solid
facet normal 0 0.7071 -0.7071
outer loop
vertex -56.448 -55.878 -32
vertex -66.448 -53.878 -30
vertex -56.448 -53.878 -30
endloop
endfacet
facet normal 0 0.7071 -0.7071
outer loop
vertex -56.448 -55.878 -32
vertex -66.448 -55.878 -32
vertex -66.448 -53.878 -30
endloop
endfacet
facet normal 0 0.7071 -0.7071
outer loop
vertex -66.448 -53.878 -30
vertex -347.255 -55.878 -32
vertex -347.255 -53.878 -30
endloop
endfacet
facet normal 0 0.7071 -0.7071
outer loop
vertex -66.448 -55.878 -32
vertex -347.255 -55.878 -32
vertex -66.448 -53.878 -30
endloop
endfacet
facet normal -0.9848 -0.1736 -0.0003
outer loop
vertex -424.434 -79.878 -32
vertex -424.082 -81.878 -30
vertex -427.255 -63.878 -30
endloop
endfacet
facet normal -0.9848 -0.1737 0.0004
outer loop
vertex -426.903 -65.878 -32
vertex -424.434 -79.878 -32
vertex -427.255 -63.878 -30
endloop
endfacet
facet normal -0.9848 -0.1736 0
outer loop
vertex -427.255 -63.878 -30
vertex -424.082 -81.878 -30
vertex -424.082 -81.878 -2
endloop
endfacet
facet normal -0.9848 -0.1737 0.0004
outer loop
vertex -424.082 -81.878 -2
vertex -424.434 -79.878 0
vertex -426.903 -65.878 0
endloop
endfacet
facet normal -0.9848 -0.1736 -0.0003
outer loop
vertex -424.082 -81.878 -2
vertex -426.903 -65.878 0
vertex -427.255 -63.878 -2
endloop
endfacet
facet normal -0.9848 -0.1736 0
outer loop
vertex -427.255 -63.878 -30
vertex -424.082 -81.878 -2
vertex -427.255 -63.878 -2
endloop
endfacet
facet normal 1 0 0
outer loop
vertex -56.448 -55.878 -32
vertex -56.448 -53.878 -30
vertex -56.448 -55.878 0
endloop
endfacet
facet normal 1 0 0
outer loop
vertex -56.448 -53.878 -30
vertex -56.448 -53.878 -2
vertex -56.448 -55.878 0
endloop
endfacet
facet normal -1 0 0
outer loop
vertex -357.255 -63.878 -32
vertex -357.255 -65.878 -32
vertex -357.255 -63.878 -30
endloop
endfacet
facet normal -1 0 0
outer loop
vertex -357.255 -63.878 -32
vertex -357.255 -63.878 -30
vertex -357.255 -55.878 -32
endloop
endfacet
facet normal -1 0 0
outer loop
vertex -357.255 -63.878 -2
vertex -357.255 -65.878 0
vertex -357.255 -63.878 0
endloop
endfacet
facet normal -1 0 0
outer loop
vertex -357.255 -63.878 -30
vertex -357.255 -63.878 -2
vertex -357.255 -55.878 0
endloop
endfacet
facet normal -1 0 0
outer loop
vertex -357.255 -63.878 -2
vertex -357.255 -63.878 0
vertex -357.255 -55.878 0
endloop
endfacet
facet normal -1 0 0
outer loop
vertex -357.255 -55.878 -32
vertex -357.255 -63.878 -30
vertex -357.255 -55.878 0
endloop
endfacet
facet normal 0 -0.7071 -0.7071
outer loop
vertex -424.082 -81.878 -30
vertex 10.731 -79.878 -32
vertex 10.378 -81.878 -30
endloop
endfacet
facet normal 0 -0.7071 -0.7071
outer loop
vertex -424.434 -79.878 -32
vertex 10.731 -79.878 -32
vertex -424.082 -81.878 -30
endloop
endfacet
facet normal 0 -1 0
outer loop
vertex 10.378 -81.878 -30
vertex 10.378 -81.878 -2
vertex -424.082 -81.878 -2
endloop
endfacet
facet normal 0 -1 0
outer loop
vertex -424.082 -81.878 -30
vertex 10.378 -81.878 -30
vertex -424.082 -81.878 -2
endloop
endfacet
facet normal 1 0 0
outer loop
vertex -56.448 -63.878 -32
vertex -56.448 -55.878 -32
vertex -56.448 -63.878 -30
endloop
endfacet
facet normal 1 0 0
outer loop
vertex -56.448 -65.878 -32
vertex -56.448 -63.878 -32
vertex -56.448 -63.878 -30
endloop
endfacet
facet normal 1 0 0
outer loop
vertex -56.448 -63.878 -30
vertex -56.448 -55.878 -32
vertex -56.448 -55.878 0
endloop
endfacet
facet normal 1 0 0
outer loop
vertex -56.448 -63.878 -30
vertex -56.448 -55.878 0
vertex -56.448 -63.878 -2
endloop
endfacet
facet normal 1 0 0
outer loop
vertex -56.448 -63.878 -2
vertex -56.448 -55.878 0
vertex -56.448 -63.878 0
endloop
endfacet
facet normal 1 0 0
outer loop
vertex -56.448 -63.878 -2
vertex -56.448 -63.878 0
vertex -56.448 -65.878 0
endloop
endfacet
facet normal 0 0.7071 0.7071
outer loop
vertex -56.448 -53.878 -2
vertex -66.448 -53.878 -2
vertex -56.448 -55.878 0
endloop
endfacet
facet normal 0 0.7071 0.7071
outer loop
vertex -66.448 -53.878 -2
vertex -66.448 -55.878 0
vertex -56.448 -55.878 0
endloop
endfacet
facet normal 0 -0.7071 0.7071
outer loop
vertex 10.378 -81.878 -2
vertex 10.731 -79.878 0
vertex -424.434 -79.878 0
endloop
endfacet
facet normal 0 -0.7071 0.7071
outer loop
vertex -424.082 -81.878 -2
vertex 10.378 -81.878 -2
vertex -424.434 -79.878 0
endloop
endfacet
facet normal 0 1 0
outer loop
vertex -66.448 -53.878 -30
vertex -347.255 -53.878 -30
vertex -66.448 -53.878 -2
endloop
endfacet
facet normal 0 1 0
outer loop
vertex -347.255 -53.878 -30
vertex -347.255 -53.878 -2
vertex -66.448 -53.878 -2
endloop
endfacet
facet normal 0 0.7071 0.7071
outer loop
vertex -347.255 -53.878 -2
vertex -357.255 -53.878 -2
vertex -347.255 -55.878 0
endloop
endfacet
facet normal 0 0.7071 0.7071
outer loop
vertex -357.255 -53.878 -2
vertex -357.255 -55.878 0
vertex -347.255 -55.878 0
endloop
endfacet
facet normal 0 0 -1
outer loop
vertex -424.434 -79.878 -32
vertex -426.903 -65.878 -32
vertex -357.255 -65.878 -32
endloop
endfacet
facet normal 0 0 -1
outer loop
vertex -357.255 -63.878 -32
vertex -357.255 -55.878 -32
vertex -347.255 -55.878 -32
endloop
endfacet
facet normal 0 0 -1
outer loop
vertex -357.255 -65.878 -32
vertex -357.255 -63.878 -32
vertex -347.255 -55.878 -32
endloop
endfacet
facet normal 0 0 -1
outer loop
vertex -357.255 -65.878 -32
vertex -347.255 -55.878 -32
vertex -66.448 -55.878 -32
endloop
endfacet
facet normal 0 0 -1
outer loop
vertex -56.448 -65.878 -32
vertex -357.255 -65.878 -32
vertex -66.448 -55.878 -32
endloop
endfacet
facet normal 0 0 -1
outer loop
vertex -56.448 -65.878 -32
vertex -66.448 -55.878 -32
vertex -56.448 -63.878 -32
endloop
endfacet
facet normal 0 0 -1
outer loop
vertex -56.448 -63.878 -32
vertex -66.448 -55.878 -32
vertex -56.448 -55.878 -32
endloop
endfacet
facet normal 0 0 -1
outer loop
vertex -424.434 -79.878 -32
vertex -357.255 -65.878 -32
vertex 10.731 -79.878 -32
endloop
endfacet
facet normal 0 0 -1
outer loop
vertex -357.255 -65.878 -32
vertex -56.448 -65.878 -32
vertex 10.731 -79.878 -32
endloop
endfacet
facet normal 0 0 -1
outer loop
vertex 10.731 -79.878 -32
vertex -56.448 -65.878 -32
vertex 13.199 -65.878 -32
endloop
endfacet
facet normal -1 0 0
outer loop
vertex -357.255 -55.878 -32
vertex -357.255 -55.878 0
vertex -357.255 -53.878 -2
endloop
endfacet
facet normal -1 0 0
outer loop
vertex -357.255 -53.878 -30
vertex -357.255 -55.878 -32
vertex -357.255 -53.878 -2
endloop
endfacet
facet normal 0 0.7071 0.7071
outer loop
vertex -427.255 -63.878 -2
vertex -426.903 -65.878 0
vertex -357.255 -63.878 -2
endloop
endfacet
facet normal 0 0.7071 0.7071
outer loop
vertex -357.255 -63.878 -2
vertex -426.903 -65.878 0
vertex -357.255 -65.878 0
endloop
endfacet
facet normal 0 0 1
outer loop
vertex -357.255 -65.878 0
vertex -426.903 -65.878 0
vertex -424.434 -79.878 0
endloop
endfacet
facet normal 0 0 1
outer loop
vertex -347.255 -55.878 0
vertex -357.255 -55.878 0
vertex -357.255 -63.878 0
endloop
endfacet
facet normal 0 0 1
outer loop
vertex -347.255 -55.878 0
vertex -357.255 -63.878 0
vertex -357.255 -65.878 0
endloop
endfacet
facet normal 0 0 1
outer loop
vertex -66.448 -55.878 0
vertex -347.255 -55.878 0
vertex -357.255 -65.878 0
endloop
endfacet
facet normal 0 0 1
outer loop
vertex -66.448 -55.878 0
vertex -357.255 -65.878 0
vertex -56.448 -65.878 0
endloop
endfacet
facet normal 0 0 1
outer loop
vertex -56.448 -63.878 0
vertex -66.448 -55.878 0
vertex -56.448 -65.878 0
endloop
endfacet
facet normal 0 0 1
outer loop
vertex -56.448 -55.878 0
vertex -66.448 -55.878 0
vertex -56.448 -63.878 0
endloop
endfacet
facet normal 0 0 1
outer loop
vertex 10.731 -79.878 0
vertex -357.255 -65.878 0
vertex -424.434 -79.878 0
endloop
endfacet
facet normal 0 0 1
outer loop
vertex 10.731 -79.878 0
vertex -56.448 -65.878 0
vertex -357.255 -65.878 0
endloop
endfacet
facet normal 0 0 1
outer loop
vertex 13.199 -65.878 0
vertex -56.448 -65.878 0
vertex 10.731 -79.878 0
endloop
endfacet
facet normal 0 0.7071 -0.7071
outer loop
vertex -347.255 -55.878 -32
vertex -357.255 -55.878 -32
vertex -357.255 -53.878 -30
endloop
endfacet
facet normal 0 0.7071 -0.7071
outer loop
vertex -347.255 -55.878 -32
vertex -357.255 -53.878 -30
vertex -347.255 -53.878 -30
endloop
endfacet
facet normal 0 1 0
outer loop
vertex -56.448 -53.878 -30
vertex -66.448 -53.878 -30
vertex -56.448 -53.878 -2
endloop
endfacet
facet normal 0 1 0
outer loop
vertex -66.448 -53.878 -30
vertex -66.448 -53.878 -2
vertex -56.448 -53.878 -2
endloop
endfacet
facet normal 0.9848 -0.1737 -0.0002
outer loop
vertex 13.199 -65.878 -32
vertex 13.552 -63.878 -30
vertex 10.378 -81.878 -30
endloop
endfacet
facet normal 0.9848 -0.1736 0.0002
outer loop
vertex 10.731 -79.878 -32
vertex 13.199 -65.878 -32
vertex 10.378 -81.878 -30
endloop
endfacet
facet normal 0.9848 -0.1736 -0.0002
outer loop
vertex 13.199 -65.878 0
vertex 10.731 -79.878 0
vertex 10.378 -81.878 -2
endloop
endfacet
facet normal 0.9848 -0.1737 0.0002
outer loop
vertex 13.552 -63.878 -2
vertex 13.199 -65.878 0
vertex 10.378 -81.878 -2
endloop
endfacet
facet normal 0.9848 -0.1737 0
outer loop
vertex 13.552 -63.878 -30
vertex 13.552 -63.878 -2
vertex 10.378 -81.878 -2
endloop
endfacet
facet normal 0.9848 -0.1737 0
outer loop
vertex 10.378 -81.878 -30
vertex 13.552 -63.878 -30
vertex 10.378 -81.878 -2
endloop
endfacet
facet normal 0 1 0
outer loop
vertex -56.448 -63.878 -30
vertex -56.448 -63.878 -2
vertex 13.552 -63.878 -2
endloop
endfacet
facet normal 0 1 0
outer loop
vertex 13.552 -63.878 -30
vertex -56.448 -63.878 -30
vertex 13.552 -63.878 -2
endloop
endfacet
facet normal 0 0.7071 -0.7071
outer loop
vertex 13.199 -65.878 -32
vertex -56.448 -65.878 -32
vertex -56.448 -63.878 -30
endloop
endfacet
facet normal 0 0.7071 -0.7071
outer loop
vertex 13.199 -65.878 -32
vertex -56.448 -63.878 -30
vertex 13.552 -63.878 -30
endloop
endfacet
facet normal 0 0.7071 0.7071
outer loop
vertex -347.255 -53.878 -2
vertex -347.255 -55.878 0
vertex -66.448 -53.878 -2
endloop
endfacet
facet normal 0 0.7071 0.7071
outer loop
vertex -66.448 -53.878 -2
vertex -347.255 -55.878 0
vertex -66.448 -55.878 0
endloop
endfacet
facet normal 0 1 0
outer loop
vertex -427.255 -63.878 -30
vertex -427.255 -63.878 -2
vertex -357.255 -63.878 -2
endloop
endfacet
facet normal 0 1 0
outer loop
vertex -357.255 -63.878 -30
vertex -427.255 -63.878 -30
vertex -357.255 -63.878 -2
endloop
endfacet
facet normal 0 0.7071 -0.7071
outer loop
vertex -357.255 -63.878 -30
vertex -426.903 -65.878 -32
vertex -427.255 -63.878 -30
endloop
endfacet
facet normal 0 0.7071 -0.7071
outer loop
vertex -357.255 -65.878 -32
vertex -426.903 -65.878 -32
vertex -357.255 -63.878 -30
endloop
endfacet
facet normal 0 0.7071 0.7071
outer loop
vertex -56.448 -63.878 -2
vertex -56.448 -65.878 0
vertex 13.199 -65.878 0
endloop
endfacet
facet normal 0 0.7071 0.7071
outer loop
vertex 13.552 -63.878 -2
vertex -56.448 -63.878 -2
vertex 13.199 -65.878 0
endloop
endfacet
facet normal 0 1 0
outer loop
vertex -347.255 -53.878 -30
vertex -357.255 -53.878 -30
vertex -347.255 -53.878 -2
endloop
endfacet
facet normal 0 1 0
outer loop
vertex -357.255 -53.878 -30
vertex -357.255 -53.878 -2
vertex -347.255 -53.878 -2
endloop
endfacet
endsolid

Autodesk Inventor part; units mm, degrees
ref_plane "YZ Plane" through (0, 0, 0) normal (1, 0, 0) x (0, 1, 0)
ref_plane "XZ Plane" through (0, 0, 0) normal (0, 1, 0) x (-1, 0, 0)
ref_plane "XY Plane" through (0, 0, 0) normal (0, 0, 1) x (1, 0, 0)
sketch "Sketch1" plane through (0, 0, 0) normal (0, 0, 1) x (1, 0, 0)
  line L0 (-357.2554, -61.8782) -> (-427.6081, -61.8782) construction
  line L1 (-357.2554, -61.8782) -> (-357.2554, -55.8782) construction
  line L2 (-405.0222, -45.9997) -> (-425.3346, 69.1978) construction
  line L3 (-419.5247, 76.1218) -> (-425.3346, 69.1978) construction
  line L4 (-408.3518, 76.1218) -> (-408.3518, 82.1218) construction
  line L5 (-450.7203, 69.1978) -> (-427.6081, -61.8782) construction
  line L6 (13.9045, -61.8782) -> (-56.4482, -61.8782) construction
  line L7 (13.9045, -61.8782) -> (37.0167, 69.1978) construction
  line L8 (-5.3518, 82.1218) -> (-5.3518, 76.1218) construction
  line L9 (11.631, 69.1978) -> (5.8211, 76.1218) construction
  line L10 (11.631, 69.1978) -> (-8.6814, -45.9997) construction
  line L11 (-56.4482, -55.8782) -> (-56.4482, -61.8782) construction
  line L12 (13.5518, -63.8782) -> (13.9045, -61.8782) construction
  line L13 (13.9045, -61.8782) -> (-56.4482, -61.8782) construction
  line L14 (-56.4482, -61.8782) -> (-56.4482, -63.8782) construction
  line L15 (-56.4482, -63.8782) -> (13.5518, -63.8782) construction
  line L16 (-357.2554, -63.8782) -> (-357.2554, -61.8782) construction
  line L17 (-357.2554, -61.8782) -> (-427.6081, -61.8782) construction
  line L18 (-427.6081, -61.8782) -> (-427.2554, -63.8782) construction
  line L19 (-427.2554, -63.8782) -> (-357.2554, -63.8782) construction
  line L20 (-347.2554, -53.8782) -> (-66.4482, -53.8782)
  line L21 (-56.4482, -63.8782) -> (13.5518, -63.8782)
  line L22 (13.5518, -63.8782) -> (10.3779, -81.8782)
  line L23 (10.3779, -81.8782) -> (-424.0815, -81.8782)
  line L24 (-424.0815, -81.8782) -> (-427.2554, -63.8782)
  line L25 (-427.2554, -63.8782) -> (-357.2554, -63.8782)
  line L26 (45.2684, 76.1218) -> (37.0167, 69.1978) projected
  line L27 (94.6482, 76.1218) -> (94.6482, 82.1218) projected
  line L28 (-508.3518, 82.1218) -> (-508.3518, 76.1218) projected
  line L29 (-450.7203, 69.1978) -> (-458.972, 76.1218) projected
  line L30 (-5.3518, 82.1218) -> (94.6482, 82.1218) projected
  line L31 (-508.3518, 82.1218) -> (-408.3518, 82.1218) projected
  line L32 (-56.4482, -55.8782) -> (-20.4541, -55.8782) projected
  line L33 (94.6482, 76.1218) -> (45.2684, 76.1218) projected
  line L34 (5.8211, 76.1218) -> (-5.3518, 76.1218) projected
  line L35 (-20.4541, -55.8782) -> (-8.6814, -45.9997) projected
  line L36 (-405.0222, -45.9997) -> (-393.2495, -55.8782) projected
  line L37 (-408.3518, 76.1218) -> (-419.5247, 76.1218) projected
  line L38 (-458.972, 76.1218) -> (-508.3518, 76.1218) projected
  line L39 (-393.2495, -55.8782) -> (-357.2554, -55.8782) projected
  line L40 (-66.4482, -53.8782) -> (-56.4482, -53.8782)
  line L41 (-56.4482, -53.8782) -> (-56.4482, -63.8782)
  line L42 (-357.2554, -63.8782) -> (-357.2554, -53.8782)
  line L43 (-357.2554, -53.8782) -> (-347.2554, -53.8782)
  point P0 (0, 0)
  dimension "d0" = 28
extrude "Extrusion1" add sketch "Sketch1" against normal blind 32
chamfer "Chamfer1" distance 2 angle 45 8 edges at (-392.2554, -63.8782, 0) (-392.2554, -63.8782, -32) (-206.8518, -81.8782, -32) (-206.8518, -81.8782, 0) (-21.4482, -63.8782, 0) (-21.4482, -63.8782, -32) (-206.8518, -53.8782, 0) (-206.8518, -53.8782, -32)
properties part number "DNW_CON_V2" material "Wood (Birch)"
